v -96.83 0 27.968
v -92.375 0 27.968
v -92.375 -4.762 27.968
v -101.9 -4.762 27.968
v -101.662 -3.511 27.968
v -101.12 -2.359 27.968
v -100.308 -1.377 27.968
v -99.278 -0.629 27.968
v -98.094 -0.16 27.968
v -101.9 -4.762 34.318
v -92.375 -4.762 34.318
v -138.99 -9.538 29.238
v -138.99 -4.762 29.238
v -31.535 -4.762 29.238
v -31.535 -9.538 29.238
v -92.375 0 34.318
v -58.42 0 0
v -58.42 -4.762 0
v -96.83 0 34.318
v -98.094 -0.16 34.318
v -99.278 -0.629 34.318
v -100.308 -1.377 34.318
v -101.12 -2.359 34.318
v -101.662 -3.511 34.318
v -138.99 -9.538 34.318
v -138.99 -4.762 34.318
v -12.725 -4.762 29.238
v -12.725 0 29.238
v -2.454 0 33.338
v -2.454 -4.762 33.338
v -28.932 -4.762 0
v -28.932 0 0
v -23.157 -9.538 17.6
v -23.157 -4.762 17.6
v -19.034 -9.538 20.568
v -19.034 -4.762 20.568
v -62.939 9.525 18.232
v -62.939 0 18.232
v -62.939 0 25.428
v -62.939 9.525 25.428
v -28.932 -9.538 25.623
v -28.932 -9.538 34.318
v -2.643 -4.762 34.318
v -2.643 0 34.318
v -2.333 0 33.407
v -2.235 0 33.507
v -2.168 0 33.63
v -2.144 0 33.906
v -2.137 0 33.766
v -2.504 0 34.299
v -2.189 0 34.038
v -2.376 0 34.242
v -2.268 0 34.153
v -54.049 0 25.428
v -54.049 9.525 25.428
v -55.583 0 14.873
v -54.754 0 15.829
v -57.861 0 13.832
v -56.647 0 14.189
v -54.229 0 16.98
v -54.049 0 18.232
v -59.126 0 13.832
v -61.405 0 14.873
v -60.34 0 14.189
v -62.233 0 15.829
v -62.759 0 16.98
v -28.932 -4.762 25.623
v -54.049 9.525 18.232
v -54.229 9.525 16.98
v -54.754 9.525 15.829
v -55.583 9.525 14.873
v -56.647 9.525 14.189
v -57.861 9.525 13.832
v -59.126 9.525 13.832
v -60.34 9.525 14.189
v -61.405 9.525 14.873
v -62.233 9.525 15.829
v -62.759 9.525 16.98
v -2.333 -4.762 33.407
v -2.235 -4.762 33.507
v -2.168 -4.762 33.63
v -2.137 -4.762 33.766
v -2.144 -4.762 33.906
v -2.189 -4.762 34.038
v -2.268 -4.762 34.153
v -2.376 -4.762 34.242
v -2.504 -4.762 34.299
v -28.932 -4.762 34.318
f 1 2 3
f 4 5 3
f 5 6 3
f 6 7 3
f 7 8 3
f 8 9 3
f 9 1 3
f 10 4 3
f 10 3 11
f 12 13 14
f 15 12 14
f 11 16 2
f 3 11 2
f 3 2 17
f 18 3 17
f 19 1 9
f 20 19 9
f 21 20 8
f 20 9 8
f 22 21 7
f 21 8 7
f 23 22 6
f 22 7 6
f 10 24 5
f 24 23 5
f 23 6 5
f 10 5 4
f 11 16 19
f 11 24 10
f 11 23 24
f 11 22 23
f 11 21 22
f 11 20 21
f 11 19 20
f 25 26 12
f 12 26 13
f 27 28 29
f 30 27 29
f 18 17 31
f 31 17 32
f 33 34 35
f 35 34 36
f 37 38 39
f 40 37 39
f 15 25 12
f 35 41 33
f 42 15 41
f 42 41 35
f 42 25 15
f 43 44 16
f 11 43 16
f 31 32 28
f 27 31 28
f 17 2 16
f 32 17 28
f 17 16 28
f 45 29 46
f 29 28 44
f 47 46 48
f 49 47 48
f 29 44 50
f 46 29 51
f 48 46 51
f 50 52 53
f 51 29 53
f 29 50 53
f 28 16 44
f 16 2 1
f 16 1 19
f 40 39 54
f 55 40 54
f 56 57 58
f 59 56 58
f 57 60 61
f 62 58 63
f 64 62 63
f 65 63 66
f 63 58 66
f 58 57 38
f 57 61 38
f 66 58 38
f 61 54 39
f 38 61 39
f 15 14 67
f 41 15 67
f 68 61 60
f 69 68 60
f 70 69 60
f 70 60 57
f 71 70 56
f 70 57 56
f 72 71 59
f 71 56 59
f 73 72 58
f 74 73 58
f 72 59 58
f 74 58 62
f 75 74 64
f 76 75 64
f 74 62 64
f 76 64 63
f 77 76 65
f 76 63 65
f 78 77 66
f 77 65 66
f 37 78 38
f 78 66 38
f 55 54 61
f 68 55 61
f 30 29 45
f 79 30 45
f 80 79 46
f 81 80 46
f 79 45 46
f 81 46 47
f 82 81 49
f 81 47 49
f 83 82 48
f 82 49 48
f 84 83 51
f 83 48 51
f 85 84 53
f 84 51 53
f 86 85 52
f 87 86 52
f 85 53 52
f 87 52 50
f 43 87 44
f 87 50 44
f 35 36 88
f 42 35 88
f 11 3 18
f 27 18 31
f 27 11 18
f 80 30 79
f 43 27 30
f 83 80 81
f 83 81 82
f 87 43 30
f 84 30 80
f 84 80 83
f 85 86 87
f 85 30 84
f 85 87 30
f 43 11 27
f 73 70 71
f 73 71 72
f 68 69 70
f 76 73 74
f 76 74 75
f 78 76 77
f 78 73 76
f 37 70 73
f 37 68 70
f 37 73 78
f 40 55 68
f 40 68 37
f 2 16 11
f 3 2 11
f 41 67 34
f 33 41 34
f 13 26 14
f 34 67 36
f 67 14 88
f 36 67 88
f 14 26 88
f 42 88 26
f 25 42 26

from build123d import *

# Parameters (mm, degrees)
F1_DEPTH    = 4.7625
F2_W        = 4.7625
F2_H        = 6.35
F3_DEPTH    = 9.525
F4_T1_DEPTH = 31.7003420835
F6_DEPTH    = 9.525
F8_DEPTH    = 4.7752


# Not quite as in the source:
# - a fillet or chamfer that OpenCascade refuses, or shapes differently, is made with other operations: its cross-section is extruded or revolved along the edge and cut away or added


with BuildPart() as f1:
    # F0 (on Front) → F1 (new body)
    with BuildSketch(Plane.XZ):
        with BuildLine():
            Line((-58.42, 0), (-28.9322432641, 0))
            Line((-28.9322432641, 0), (-12.7254, 29.2379192107))
            Line((-12.7254, 29.2379192107), (-2.4543888247, 33.3381232726))
            ThreePointArc((-2.4543888247, 33.3381232726), (-2.1438636322, 33.9058141101), (-2.6427305165, 34.3179192107))
            Line((-2.6427305165, 34.3179192107), (-12.7254, 34.3179192107))
            Line((-12.7254, 34.3179192107), (-28.8753250815, 34.3179192107))
            Line((-28.8753250815, 34.3179192107), (-92.3753250815, 34.3179192107))
            Line((-92.3753250815, 34.3179192107), (-92.3753250815, 27.9679192107))
            Line((-92.3753250815, 27.9679192107), (-58.42, 0))
        make_face()
    extrude(amount=F1_DEPTH)


with BuildPart() as f3:
    # F2 (on face) → F3 (new body)
    with BuildSketch(Plane(origin=(-92.3753250815, 0, 0), x_dir=(0, -1, 0), z_dir=(-1, 0, 0))):
        with Locations((2.38125, 31.1429192107)):
            Rectangle(F2_W, F2_H)
    extrude(amount=F3_DEPTH)

    # F4: fillet of radius 5.08 on 1 edges, made by hand

    # F4_s2 → F4_t1 (cut)
    with BuildSketch(Plane.XY.offset(15.2927481689)):
        with BuildLine():
            ThreePointArc((-96.8302566648, 0), (-100.308294905, -1.3773455468), (-101.9003250815, -4.7625))
            Line((-101.9003250815, -4.7625), (-101.9003250815, 0))
            Line((-101.9003250815, 0), (-96.8302566648, 0))
        make_face()
    extrude(amount=F4_T1_DEPTH, mode=Mode.SUBTRACT)


with BuildPart() as f6:
    # F5 (on face) → F6 (new body)
    with BuildSketch(Plane(origin=(0, 0, 0), x_dir=(-1, 0, 0), z_dir=(0, 1, 0))):
        with BuildLine():
            Line((54.0486851786, 25.4279192107), (54.0486851786, 18.2318821344))
            ThreePointArc((54.0486851786, 18.2318821344), (58.4936851786, 13.7868821344), (62.9386851786, 18.2318821344))
            Line((62.9386851786, 18.2318821344), (62.9386851786, 25.4279192107))
            Line((62.9386851786, 25.4279192107), (54.0486851786, 25.4279192107))
        make_face()
    extrude(amount=F6_DEPTH)


with BuildPart() as f8:
    # F7 (on face) → F8 (new body)
    with BuildSketch(Plane.XZ.offset(4.7625)):
        Polygon((-31.534574919, 29.2379192107), (-28.9322432641, 25.6231317048), (-28.9322432641, 34.3179192107), (-138.9904432641, 34.3179192107), (-138.9904432641, 29.2379192107), (-35.3291034698, 29.2379192107), align=None)
        Polygon((-28.9322432641, 34.3179192107), (-28.9322432641, 25.6231317048), (-23.1566244349, 17.6004668216), (-19.0338594402, 20.5684979532), align=None)
    extrude(amount=F8_DEPTH)


solid = Compound([f1.part, f3.part, f6.part, f8.part])
